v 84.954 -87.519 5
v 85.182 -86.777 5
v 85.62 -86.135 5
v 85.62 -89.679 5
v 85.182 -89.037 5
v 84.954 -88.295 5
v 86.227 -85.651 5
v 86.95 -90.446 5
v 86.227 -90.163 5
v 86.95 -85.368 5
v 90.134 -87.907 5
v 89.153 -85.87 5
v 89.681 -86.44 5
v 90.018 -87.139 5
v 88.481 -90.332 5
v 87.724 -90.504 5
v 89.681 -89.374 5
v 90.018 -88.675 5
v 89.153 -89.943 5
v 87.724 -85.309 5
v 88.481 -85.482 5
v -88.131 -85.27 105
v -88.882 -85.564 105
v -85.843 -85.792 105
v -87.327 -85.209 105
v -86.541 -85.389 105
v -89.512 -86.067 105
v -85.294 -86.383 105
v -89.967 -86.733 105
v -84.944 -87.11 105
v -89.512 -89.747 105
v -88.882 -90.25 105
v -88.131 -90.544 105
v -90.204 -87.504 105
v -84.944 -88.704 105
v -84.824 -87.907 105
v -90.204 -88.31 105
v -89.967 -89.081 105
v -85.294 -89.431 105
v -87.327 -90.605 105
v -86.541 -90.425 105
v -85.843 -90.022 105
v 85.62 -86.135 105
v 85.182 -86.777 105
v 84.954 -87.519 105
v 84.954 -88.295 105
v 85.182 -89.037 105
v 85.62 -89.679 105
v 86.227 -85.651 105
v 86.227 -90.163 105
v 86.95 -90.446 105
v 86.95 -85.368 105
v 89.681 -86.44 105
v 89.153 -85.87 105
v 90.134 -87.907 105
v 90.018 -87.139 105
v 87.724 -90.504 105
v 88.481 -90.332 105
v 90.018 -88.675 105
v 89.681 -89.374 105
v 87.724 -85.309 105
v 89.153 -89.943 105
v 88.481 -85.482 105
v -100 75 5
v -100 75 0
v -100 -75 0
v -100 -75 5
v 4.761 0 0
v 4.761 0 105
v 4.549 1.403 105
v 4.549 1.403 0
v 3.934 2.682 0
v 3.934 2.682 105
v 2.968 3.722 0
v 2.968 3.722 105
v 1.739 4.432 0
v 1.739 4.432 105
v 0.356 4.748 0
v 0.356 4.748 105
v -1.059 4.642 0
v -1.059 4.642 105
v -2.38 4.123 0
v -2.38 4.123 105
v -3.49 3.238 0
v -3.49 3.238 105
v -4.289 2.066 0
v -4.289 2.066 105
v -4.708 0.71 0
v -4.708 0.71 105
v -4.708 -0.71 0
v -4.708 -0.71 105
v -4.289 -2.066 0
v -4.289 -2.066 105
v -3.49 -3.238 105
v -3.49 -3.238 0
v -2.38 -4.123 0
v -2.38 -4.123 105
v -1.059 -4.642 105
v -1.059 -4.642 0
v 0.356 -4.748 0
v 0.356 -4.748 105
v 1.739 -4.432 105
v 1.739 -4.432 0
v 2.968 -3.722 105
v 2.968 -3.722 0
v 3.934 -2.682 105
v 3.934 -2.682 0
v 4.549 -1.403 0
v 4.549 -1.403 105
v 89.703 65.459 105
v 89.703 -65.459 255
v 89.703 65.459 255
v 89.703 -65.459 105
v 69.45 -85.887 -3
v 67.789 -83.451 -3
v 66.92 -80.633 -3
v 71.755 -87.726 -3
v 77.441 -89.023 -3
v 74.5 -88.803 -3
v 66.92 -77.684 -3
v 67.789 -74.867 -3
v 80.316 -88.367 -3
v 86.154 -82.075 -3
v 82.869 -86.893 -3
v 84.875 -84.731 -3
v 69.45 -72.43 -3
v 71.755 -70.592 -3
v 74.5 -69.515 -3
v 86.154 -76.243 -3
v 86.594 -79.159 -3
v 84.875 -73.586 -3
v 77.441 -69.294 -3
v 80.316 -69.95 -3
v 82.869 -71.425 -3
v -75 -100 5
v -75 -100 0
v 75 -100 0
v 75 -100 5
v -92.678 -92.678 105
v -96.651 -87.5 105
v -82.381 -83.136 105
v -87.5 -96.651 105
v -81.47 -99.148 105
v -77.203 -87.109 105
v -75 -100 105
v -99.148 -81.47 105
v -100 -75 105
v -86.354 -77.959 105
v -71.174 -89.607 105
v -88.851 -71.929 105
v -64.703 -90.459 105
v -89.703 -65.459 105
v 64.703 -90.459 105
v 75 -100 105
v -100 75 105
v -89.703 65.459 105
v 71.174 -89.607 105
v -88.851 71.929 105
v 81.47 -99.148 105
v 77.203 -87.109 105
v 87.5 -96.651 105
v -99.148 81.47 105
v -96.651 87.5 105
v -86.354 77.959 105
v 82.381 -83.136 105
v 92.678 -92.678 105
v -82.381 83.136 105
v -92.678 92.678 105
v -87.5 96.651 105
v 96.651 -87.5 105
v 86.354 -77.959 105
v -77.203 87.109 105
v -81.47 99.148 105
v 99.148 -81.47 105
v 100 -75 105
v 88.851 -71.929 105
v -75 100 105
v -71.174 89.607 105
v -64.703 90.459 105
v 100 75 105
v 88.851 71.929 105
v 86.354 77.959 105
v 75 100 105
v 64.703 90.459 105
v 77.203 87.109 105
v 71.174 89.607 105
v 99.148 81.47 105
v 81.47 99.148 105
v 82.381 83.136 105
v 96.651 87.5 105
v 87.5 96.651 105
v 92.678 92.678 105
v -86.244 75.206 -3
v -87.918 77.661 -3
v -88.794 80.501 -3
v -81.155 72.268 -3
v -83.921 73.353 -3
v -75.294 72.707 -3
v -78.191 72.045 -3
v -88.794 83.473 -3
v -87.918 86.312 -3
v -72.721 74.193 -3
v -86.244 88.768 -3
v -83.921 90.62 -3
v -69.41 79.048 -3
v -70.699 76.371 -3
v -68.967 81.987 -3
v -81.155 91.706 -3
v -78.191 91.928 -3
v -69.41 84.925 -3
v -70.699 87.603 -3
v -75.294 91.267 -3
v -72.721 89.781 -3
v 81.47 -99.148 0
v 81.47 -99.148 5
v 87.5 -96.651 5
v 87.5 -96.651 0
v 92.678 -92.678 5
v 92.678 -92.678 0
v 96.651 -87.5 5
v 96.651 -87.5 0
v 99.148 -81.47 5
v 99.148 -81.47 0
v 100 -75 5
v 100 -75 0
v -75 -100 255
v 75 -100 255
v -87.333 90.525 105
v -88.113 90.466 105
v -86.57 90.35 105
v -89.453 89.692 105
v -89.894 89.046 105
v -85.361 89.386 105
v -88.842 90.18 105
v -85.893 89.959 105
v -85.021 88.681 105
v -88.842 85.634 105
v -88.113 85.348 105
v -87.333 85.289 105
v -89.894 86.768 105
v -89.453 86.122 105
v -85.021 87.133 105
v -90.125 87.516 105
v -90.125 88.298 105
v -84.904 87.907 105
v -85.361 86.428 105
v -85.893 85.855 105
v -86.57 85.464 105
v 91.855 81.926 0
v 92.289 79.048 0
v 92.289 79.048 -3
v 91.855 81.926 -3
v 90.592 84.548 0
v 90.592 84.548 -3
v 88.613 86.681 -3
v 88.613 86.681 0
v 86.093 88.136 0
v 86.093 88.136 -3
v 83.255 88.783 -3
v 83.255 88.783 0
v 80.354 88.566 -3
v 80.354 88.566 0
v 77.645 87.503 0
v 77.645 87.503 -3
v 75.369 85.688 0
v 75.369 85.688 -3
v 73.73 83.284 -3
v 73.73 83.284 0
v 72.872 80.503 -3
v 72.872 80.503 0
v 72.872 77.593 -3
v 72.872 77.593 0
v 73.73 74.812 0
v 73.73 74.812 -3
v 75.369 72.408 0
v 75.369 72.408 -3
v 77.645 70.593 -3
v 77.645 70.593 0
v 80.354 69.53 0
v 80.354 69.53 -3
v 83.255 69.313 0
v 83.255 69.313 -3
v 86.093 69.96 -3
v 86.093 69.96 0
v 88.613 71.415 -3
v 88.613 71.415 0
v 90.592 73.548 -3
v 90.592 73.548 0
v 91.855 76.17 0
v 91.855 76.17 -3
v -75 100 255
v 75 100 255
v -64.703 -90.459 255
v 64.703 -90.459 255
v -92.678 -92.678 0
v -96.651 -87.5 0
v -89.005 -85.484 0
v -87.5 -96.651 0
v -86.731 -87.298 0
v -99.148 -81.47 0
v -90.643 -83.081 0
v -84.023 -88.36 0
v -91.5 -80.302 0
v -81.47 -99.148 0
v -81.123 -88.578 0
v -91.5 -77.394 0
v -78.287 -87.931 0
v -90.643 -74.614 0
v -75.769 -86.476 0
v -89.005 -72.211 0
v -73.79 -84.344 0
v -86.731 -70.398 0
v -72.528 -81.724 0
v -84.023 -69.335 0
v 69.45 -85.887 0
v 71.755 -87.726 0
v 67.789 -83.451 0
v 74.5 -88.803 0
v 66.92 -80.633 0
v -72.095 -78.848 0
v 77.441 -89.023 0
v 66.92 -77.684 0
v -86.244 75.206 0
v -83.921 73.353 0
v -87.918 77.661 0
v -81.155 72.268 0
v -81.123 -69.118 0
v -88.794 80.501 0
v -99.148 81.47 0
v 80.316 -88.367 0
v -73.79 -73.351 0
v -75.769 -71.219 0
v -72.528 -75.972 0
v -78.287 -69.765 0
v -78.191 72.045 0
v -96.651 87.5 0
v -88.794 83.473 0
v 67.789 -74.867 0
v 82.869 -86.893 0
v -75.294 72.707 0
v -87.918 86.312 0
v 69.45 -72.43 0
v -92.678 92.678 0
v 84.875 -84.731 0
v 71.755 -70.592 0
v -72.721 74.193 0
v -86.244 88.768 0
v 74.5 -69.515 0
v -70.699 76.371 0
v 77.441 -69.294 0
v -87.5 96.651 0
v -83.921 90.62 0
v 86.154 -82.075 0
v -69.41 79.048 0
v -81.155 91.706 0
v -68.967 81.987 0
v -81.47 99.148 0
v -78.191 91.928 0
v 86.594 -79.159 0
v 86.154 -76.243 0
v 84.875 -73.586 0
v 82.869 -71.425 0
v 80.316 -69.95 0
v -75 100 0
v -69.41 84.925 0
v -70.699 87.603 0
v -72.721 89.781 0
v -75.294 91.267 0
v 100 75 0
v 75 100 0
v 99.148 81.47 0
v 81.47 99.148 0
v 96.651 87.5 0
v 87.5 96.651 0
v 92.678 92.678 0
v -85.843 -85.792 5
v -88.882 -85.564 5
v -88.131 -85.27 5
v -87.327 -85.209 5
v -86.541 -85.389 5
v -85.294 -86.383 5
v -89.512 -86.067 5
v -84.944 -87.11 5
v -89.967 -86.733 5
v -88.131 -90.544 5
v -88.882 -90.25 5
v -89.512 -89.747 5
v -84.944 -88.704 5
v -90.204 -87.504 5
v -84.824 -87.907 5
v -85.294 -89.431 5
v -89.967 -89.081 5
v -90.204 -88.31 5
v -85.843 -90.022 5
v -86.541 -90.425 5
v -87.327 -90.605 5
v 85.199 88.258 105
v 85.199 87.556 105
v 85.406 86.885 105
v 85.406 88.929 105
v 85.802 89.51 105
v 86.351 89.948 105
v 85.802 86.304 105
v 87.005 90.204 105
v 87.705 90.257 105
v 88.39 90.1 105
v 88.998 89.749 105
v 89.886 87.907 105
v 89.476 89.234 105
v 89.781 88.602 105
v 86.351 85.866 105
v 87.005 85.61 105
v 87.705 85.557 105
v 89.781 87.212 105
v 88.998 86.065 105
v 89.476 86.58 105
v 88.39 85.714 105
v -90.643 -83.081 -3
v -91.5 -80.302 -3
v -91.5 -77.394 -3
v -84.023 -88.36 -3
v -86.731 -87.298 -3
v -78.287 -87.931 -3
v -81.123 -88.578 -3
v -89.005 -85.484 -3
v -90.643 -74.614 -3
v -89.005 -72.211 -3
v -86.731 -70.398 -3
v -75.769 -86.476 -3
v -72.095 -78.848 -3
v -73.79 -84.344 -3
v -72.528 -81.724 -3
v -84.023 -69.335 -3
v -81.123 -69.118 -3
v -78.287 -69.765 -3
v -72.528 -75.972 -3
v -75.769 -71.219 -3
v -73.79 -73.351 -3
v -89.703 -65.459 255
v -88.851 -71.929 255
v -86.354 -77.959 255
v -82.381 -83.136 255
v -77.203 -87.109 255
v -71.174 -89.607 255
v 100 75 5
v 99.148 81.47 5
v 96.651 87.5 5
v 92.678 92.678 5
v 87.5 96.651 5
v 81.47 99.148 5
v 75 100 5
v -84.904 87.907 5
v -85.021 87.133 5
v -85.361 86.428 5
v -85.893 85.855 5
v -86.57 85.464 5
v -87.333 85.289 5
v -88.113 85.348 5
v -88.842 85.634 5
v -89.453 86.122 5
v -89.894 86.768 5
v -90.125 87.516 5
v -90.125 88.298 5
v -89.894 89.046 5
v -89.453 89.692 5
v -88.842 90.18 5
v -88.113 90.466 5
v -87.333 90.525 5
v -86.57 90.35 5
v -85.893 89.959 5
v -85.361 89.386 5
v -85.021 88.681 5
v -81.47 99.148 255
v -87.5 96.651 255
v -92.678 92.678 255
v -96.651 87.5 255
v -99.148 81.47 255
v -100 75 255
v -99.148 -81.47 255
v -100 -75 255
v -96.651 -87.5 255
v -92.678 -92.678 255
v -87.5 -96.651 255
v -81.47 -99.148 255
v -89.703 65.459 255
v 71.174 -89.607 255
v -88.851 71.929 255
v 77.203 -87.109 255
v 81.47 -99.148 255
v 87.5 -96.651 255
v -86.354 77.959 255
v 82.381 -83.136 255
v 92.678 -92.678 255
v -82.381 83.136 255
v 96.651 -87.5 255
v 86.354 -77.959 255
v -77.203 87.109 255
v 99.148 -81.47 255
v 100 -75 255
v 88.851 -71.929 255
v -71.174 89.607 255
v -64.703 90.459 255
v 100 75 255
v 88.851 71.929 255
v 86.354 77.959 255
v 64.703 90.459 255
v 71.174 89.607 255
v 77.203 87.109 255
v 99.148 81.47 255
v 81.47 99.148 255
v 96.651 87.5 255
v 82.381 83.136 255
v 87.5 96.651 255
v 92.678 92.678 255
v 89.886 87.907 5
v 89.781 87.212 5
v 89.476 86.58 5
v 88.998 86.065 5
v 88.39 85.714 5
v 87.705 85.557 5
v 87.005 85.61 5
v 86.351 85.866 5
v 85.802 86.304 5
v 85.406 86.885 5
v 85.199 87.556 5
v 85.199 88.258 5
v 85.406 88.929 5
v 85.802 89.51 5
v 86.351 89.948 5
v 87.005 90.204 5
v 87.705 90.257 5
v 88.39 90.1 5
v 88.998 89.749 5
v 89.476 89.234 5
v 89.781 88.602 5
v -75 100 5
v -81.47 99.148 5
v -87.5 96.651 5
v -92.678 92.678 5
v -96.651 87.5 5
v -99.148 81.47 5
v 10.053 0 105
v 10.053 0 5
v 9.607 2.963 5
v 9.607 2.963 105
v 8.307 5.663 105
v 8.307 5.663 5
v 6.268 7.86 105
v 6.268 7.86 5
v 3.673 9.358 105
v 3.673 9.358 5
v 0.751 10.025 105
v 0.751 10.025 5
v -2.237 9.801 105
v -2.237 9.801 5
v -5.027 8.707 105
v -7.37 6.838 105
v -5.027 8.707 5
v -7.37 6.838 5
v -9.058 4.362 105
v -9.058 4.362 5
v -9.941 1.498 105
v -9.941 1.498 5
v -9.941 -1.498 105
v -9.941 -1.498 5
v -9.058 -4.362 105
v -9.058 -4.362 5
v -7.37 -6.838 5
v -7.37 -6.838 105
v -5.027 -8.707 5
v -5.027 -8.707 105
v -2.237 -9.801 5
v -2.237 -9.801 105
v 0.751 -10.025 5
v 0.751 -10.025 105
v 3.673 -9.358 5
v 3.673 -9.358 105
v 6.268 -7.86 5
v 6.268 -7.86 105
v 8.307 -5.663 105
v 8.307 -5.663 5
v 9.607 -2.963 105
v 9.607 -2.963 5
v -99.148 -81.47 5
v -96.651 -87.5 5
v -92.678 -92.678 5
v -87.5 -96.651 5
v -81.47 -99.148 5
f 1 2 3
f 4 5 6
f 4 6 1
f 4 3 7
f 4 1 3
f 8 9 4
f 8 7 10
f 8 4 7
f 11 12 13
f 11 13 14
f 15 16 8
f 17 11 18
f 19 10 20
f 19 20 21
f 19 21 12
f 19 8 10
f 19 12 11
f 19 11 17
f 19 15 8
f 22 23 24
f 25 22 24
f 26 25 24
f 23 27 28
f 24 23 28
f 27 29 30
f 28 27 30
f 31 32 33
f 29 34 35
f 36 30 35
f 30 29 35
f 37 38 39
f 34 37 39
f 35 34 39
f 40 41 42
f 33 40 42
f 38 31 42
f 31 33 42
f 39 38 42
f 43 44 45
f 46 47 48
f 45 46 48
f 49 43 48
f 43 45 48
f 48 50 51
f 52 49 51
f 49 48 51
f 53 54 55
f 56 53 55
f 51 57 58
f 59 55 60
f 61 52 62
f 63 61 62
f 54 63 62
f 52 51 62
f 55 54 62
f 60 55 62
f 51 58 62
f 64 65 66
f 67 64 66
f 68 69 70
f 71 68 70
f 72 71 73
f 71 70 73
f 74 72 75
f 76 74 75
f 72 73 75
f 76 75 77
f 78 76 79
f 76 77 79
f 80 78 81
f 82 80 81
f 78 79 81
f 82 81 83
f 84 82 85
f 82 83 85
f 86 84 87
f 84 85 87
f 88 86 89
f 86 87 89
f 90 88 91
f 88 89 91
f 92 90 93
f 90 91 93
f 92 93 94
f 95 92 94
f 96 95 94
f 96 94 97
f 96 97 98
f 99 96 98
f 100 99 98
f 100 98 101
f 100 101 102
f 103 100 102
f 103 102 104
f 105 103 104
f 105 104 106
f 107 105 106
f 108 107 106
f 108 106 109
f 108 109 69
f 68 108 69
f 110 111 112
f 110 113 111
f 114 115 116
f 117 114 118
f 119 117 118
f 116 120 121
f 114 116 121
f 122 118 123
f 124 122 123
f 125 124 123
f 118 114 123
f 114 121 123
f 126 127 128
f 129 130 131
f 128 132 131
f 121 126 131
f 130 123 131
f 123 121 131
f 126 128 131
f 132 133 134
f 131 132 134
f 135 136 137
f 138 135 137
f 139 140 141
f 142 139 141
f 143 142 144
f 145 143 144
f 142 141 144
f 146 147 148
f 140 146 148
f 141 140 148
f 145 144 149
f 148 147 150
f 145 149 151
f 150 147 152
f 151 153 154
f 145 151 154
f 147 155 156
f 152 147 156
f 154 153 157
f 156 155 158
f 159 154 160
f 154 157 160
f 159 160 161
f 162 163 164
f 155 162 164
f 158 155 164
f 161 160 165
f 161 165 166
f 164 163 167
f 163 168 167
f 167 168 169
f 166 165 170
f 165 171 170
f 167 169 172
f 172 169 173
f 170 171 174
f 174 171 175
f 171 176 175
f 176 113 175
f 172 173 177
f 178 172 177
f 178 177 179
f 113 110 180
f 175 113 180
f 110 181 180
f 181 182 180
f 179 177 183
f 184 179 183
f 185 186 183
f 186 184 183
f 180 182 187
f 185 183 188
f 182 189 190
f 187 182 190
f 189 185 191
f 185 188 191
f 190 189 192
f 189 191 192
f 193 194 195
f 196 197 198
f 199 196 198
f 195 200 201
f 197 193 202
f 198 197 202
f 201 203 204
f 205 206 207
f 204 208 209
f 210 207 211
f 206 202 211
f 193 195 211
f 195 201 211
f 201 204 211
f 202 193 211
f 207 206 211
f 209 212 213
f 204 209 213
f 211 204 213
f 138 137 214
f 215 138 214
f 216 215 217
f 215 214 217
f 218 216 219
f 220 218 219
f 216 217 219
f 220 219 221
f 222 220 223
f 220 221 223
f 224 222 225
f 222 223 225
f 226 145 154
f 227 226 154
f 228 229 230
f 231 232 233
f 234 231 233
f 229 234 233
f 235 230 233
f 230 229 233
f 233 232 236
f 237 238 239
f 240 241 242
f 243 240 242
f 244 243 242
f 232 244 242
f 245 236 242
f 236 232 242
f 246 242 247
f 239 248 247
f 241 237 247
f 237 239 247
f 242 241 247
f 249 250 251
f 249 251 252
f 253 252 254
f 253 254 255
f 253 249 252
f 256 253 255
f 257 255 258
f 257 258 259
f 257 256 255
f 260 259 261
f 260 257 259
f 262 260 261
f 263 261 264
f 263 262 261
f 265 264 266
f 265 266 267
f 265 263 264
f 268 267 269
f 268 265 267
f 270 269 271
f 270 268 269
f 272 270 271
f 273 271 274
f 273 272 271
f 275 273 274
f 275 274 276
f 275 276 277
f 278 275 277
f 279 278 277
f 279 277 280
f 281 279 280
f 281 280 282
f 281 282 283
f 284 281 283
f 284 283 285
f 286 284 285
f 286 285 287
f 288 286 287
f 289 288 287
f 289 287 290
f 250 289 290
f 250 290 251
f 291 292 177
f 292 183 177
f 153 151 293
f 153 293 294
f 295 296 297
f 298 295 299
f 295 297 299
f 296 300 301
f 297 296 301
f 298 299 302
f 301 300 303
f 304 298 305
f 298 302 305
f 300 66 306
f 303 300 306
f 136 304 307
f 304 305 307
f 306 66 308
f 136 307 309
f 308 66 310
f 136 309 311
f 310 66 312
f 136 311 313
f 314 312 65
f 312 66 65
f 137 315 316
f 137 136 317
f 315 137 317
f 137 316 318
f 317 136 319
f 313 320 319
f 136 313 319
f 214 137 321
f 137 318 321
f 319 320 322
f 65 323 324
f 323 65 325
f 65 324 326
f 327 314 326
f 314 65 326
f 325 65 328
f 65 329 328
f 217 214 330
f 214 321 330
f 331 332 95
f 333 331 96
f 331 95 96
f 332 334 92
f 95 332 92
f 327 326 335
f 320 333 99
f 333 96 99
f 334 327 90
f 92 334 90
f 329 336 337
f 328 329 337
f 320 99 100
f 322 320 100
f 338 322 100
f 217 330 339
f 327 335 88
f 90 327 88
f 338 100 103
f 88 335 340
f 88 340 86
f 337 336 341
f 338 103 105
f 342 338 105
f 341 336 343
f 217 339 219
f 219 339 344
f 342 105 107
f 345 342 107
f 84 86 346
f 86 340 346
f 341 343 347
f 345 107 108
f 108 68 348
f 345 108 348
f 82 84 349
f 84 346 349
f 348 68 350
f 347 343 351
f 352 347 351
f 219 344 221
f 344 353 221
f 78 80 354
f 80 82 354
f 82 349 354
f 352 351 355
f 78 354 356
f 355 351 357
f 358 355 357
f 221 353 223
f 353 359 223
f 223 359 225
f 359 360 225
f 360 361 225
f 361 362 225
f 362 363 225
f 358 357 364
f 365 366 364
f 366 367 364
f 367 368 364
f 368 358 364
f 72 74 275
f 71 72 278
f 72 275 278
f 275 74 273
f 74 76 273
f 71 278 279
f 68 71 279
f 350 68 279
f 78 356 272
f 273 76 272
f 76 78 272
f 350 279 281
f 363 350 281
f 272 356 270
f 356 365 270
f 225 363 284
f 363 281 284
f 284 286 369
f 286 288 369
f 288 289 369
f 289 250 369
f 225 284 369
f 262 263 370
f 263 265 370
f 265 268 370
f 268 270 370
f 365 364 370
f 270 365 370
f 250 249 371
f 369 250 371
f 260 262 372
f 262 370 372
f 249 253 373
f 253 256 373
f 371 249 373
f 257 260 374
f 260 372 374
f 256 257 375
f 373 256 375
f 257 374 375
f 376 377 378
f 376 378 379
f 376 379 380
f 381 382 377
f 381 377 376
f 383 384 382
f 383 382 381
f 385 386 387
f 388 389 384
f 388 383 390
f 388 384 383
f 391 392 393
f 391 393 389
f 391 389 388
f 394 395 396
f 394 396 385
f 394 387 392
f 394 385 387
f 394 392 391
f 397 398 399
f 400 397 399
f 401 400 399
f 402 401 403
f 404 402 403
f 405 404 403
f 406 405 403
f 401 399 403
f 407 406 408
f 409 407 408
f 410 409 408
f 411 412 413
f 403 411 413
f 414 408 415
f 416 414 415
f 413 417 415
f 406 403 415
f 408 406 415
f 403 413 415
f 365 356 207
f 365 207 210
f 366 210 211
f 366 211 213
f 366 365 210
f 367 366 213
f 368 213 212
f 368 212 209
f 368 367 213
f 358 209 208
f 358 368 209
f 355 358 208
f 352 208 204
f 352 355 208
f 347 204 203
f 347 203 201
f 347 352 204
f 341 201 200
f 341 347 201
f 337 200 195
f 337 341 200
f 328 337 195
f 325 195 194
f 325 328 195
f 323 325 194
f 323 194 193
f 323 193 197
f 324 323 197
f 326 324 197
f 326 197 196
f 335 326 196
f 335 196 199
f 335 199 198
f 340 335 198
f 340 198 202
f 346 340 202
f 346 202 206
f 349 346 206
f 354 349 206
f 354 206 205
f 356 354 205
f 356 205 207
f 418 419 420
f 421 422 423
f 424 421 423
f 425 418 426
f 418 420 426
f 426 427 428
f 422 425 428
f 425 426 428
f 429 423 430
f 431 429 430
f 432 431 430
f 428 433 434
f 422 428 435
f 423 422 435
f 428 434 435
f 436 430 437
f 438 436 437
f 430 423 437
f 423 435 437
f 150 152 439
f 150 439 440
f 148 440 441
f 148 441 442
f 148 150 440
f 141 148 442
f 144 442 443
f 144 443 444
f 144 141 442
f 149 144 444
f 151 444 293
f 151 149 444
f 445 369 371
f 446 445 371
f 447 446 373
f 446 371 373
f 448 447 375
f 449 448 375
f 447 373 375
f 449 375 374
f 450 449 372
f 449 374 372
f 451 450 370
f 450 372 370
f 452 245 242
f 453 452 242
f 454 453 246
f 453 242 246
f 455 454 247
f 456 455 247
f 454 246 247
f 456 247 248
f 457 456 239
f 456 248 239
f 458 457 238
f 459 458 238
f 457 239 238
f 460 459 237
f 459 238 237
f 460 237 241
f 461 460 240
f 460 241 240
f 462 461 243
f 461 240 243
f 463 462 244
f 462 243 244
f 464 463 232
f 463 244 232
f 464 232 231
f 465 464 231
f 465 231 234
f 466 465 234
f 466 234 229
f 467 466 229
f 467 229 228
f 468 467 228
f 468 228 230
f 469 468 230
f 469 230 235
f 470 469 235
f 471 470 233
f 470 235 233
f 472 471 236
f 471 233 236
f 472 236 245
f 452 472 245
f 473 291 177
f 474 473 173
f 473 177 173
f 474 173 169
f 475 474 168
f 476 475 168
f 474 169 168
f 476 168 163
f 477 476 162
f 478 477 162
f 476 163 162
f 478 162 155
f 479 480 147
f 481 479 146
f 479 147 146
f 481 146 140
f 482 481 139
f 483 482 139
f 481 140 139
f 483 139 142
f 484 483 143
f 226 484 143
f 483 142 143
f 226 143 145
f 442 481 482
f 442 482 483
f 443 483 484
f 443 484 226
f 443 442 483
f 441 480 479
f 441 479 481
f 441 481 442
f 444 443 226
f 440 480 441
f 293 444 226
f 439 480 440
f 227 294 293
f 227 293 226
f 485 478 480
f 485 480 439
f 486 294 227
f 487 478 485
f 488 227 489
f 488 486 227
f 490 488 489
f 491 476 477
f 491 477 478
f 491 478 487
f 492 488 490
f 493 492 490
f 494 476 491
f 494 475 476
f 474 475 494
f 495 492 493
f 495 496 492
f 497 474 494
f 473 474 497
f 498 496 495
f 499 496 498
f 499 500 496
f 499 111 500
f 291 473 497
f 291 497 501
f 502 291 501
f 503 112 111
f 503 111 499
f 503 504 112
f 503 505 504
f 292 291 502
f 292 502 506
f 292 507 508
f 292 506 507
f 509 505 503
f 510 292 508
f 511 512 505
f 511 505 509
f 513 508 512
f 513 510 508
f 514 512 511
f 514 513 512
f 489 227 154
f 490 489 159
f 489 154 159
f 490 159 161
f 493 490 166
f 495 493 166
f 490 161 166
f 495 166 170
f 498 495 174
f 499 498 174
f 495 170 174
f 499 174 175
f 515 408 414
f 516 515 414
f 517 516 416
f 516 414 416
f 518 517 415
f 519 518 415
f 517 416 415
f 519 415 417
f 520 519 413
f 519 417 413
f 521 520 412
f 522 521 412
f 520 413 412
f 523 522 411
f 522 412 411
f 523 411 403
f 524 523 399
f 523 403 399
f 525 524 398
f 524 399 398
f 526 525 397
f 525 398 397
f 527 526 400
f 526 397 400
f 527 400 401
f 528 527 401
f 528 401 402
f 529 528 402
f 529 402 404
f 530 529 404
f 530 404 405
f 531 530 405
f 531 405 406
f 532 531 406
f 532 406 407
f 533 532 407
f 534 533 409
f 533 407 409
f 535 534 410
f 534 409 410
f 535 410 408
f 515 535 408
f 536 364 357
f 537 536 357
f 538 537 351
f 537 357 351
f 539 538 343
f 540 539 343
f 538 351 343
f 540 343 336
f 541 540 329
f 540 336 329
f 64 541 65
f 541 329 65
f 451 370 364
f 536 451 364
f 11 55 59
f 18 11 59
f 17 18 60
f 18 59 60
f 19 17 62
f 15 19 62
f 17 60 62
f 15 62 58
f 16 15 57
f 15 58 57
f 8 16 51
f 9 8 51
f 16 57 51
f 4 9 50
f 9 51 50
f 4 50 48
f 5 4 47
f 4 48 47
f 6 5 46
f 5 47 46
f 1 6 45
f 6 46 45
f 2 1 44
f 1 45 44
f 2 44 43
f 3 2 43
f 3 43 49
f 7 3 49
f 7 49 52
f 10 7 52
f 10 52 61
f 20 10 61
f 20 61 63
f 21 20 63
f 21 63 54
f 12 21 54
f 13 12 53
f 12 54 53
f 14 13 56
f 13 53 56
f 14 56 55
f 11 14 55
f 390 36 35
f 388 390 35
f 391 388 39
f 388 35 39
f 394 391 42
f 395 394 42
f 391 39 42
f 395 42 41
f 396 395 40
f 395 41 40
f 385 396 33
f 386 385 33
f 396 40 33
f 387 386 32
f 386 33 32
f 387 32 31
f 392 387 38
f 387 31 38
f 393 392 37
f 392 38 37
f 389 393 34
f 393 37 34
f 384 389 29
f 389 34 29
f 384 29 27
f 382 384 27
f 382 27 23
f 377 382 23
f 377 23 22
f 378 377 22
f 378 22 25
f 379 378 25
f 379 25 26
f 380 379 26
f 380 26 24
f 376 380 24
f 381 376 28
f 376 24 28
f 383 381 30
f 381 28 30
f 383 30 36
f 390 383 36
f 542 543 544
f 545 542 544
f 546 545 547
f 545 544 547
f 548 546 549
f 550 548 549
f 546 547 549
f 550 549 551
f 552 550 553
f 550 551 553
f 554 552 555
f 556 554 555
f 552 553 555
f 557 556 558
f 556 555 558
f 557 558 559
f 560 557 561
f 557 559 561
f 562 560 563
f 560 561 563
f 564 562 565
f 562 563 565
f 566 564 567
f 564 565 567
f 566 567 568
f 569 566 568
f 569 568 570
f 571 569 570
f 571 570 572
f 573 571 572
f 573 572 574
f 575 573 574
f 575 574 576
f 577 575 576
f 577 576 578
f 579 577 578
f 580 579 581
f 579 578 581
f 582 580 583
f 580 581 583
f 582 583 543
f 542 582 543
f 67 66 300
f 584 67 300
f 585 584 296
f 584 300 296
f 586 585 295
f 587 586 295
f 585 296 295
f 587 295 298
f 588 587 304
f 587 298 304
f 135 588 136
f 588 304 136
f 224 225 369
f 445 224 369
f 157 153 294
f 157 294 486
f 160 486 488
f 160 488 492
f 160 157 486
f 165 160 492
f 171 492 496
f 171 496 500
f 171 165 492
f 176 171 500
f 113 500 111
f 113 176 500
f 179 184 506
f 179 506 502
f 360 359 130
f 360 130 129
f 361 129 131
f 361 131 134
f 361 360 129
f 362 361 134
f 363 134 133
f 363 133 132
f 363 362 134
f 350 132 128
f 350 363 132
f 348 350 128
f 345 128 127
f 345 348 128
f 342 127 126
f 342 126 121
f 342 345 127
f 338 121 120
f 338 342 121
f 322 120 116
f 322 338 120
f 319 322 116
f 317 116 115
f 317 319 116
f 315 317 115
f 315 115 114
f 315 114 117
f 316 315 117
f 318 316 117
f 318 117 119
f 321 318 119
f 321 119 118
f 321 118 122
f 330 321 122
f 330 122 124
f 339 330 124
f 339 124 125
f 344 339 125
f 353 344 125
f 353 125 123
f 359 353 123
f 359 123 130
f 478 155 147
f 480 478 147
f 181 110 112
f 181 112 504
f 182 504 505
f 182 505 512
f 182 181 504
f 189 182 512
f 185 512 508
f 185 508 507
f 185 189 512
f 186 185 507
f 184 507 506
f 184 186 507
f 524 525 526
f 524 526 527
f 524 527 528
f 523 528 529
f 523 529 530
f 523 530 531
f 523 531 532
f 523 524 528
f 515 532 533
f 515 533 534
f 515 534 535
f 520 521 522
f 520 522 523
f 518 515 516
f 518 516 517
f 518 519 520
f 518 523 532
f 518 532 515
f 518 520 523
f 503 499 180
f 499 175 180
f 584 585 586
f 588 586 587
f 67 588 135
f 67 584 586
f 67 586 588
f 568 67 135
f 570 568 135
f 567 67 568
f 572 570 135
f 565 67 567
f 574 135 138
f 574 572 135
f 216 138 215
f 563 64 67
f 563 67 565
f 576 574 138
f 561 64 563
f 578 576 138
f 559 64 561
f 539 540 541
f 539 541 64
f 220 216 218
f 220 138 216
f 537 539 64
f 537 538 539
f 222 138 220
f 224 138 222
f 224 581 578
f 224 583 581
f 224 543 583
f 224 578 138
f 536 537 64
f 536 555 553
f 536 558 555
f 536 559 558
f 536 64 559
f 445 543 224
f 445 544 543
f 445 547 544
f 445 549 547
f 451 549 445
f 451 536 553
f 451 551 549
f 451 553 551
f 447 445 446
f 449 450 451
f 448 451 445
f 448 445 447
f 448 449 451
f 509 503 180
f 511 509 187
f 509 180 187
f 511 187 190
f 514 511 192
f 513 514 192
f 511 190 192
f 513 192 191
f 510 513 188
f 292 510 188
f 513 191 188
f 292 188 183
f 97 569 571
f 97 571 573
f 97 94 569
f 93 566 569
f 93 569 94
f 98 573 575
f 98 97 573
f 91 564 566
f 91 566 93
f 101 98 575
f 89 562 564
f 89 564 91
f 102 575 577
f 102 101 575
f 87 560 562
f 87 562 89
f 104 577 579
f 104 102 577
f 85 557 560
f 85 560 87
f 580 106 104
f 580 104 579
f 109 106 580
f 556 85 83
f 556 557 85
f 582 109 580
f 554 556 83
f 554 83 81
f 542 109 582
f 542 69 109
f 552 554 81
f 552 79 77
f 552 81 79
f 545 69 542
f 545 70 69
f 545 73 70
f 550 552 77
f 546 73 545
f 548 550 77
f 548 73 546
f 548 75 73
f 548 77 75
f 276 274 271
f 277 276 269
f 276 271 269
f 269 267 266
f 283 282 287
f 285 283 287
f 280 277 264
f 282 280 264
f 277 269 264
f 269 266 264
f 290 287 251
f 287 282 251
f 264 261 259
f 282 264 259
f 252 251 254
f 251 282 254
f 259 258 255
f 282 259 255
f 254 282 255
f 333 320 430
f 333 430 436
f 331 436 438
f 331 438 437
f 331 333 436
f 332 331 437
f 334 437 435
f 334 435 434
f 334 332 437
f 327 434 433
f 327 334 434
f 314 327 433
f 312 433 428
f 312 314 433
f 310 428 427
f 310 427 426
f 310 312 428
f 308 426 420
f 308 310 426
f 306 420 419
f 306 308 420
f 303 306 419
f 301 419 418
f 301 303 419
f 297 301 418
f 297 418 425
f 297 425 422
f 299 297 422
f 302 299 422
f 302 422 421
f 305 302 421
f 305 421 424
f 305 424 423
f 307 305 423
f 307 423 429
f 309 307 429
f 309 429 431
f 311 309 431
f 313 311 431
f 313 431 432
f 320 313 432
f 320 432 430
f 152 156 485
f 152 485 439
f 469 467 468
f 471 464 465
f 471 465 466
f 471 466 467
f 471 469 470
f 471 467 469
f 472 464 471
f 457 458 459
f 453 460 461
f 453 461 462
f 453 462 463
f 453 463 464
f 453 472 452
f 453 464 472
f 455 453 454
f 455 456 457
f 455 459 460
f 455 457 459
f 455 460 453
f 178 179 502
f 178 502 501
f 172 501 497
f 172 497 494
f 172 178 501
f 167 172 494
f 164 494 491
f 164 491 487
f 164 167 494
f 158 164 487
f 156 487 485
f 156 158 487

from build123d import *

# Parameters (mm, degrees)
F1_DEPTH  = 5
F2_R      = 9.8923209576
F3_DEPTH  = 8
F4_R      = 9.7627275274
F5_DEPTH  = 8
F6_R      = 9.9691740399
F7_DEPTH  = 8
F8_R      = 9.7571742201
F9_DEPTH  = 8
F10_R     = 10.0534343547
F11_DEPTH = 100
F12_R     = 4.7609440729
F13_DEPTH = 108.001
F15_DEPTH = 100
F17_DEPTH = 100
F18_DEPTH = 50
F19_R     = 2.7052817388
F20_DEPTH = 100
F21_R     = 2.6248544572
F22_DEPTH = 100
F23_R     = 2.3563527367
F24_DEPTH = 100
F25_R     = 2.6047813855
F26_DEPTH = 100


with BuildPart() as f1:
    # F0 (on Top) → F1 (new body)
    with BuildSketch(Plane.XY):
        with BuildLine():
            Line((-75, -100), (75, -100))
            ThreePointArc((75, -100), (92.6776695297, -92.6776695297), (100, -75))
            Line((100, -75), (100, 75))
            ThreePointArc((100, 75), (92.6776695297, 92.6776695297), (75, 100))
            Line((75, 100), (-75, 100))
            ThreePointArc((-75, 100), (-92.6776695297, 92.6776695297), (-100, 75))
            Line((-100, 75), (-100, -75))
            ThreePointArc((-100, -75), (-92.6776695297, -92.6776695297), (-75, -100))
        make_face()
    extrude(amount=F1_DEPTH)

    # F2 (on face) → F3 (join)
    with BuildSketch(Plane.XY.offset(5)):
        with Locations((76.7015740275, -79.158835113)):
            Circle(F2_R)
    extrude(amount=-F3_DEPTH)

    # F4 (on face) → F5 (join)
    with BuildSketch(Plane.XY.offset(5)):
        with Locations((82.5259238482, 79.0480151772)):
            Circle(F4_R)
    extrude(amount=-F5_DEPTH)

    # F6 (on face) → F7 (join)
    with BuildSketch(Plane.XY.offset(5)):
        with Locations((-78.9363756776, 81.9867923856)):
            Circle(F6_R)
    extrude(amount=-F7_DEPTH)

    # F8 (on face) → F9 (join)
    with BuildSketch(Plane.XY.offset(5)):
        with Locations((-81.8521156907, -78.8478627801)):
            Circle(F8_R)
    extrude(amount=-F9_DEPTH)

    # F10 (on face) → F11 (join)
    with BuildSketch(Plane.XY.offset(5)):
        Circle(F10_R)
    extrude(amount=F11_DEPTH)

    # F12 (on face) → F13 (cut, through all)
    with BuildSketch(Plane.XY.offset(105)):
        Circle(F12_R)
    extrude(amount=-F13_DEPTH, mode=Mode.SUBTRACT)

    # F14 (on face) → F15 (join)
    with BuildSketch(Plane.XY.offset(105)):
        with BuildLine():
            Line((-75, -100), (75, -100))
            ThreePointArc((75, -100), (92.6776695297, -92.6776695297), (100, -75))
            Line((100, -75), (100, 75))
            ThreePointArc((100, 75), (92.6776695297, 92.6776695297), (75, 100))
            Line((75, 100), (-75, 100))
            ThreePointArc((-75, 100), (-92.6776695297, 92.6776695297), (-100, 75))
            Line((-100, 75), (-100, -75))
            ThreePointArc((-100, -75), (-92.6776695297, -92.6776695297), (-75, -100))
        make_face()
    extrude(amount=F15_DEPTH)

    # F16 (on face) → F17 (cut)
    with BuildSketch(Plane.XY.offset(205)):
        with BuildLine():
            Line((89.7032395005, -65.4586389661), (89.7032395005, 0))
            Line((89.7032395005, 0), (89.7032395005, 65.4586389661))
            ThreePointArc((89.7032395005, 65.4586389661), (82.3809090302, 83.1363084957), (64.7032395005, 90.4586389661))
            Line((64.7032395005, 90.4586389661), (0, 90.4586389661))
            Line((0, 90.4586389661), (-64.7032395005, 90.4586389661))
            ThreePointArc((-64.7032395005, 90.4586389661), (-82.3809090302, 83.1363084957), (-89.7032395005, 65.4586389661))
            Line((-89.7032395005, 65.4586389661), (-89.7032395005, -65.4586389661))
            ThreePointArc((-89.7032395005, -65.4586389661), (-82.3809090302, -83.1363084957), (-64.7032395005, -90.4586389661))
            Line((-64.7032395005, -90.4586389661), (0, -90.4586389661))
            Line((0, -90.4586389661), (64.7032395005, -90.4586389661))
            ThreePointArc((64.7032395005, -90.4586389661), (82.3809090302, -83.1363084957), (89.7032395005, -65.4586389661))
        make_face()
    extrude(amount=-F17_DEPTH, mode=Mode.SUBTRACT)

    # F18 (add): a face of the model
    f18_faces = [f1.faces().sort_by_distance(p)[0] for p in [
        (0, -97.1715728753, 205),
    ]]
    extrude(f18_faces, amount=F18_DEPTH)


with BuildPart() as f20:
    # F19 (on face) → F20 (new body, through all)
    with BuildSketch(Plane(origin=(0, 0, 105), x_dir=(1, 0, 0), z_dir=(0, 0, -1))):
        with Locations((-87.5292892799, 87.9069890127)):
            Circle(F19_R)
    extrude(amount=F20_DEPTH)


with BuildPart() as f22:
    # F21 (on face) → F22 (new body, through all)
    with BuildSketch(Plane(origin=(0, 0, 105), x_dir=(1, 0, 0), z_dir=(0, 0, -1))):
        with Locations((-87.5292892799, -87.9069890127)):
            Circle(F21_R)
    extrude(amount=F22_DEPTH)


with BuildPart() as f24:
    # F23 (on face) → F24 (new body, through all)
    with BuildSketch(Plane(origin=(0, 0, 105), x_dir=(1, 0, 0), z_dir=(0, 0, -1))):
        with Locations((87.5292892799, -87.9069890127)):
            Circle(F23_R)
    extrude(amount=F24_DEPTH)


with BuildPart() as f26:
    # F25 (on face) → F26 (new body, through all)
    with BuildSketch(Plane(origin=(0, 0, 105), x_dir=(1, 0, 0), z_dir=(0, 0, -1))):
        with Locations((87.5292892799, 87.9069890127)):
            Circle(F25_R)
    extrude(amount=F26_DEPTH)


solid = Compound([f1.part, f20.part, f22.part, f24.part, f26.part])
